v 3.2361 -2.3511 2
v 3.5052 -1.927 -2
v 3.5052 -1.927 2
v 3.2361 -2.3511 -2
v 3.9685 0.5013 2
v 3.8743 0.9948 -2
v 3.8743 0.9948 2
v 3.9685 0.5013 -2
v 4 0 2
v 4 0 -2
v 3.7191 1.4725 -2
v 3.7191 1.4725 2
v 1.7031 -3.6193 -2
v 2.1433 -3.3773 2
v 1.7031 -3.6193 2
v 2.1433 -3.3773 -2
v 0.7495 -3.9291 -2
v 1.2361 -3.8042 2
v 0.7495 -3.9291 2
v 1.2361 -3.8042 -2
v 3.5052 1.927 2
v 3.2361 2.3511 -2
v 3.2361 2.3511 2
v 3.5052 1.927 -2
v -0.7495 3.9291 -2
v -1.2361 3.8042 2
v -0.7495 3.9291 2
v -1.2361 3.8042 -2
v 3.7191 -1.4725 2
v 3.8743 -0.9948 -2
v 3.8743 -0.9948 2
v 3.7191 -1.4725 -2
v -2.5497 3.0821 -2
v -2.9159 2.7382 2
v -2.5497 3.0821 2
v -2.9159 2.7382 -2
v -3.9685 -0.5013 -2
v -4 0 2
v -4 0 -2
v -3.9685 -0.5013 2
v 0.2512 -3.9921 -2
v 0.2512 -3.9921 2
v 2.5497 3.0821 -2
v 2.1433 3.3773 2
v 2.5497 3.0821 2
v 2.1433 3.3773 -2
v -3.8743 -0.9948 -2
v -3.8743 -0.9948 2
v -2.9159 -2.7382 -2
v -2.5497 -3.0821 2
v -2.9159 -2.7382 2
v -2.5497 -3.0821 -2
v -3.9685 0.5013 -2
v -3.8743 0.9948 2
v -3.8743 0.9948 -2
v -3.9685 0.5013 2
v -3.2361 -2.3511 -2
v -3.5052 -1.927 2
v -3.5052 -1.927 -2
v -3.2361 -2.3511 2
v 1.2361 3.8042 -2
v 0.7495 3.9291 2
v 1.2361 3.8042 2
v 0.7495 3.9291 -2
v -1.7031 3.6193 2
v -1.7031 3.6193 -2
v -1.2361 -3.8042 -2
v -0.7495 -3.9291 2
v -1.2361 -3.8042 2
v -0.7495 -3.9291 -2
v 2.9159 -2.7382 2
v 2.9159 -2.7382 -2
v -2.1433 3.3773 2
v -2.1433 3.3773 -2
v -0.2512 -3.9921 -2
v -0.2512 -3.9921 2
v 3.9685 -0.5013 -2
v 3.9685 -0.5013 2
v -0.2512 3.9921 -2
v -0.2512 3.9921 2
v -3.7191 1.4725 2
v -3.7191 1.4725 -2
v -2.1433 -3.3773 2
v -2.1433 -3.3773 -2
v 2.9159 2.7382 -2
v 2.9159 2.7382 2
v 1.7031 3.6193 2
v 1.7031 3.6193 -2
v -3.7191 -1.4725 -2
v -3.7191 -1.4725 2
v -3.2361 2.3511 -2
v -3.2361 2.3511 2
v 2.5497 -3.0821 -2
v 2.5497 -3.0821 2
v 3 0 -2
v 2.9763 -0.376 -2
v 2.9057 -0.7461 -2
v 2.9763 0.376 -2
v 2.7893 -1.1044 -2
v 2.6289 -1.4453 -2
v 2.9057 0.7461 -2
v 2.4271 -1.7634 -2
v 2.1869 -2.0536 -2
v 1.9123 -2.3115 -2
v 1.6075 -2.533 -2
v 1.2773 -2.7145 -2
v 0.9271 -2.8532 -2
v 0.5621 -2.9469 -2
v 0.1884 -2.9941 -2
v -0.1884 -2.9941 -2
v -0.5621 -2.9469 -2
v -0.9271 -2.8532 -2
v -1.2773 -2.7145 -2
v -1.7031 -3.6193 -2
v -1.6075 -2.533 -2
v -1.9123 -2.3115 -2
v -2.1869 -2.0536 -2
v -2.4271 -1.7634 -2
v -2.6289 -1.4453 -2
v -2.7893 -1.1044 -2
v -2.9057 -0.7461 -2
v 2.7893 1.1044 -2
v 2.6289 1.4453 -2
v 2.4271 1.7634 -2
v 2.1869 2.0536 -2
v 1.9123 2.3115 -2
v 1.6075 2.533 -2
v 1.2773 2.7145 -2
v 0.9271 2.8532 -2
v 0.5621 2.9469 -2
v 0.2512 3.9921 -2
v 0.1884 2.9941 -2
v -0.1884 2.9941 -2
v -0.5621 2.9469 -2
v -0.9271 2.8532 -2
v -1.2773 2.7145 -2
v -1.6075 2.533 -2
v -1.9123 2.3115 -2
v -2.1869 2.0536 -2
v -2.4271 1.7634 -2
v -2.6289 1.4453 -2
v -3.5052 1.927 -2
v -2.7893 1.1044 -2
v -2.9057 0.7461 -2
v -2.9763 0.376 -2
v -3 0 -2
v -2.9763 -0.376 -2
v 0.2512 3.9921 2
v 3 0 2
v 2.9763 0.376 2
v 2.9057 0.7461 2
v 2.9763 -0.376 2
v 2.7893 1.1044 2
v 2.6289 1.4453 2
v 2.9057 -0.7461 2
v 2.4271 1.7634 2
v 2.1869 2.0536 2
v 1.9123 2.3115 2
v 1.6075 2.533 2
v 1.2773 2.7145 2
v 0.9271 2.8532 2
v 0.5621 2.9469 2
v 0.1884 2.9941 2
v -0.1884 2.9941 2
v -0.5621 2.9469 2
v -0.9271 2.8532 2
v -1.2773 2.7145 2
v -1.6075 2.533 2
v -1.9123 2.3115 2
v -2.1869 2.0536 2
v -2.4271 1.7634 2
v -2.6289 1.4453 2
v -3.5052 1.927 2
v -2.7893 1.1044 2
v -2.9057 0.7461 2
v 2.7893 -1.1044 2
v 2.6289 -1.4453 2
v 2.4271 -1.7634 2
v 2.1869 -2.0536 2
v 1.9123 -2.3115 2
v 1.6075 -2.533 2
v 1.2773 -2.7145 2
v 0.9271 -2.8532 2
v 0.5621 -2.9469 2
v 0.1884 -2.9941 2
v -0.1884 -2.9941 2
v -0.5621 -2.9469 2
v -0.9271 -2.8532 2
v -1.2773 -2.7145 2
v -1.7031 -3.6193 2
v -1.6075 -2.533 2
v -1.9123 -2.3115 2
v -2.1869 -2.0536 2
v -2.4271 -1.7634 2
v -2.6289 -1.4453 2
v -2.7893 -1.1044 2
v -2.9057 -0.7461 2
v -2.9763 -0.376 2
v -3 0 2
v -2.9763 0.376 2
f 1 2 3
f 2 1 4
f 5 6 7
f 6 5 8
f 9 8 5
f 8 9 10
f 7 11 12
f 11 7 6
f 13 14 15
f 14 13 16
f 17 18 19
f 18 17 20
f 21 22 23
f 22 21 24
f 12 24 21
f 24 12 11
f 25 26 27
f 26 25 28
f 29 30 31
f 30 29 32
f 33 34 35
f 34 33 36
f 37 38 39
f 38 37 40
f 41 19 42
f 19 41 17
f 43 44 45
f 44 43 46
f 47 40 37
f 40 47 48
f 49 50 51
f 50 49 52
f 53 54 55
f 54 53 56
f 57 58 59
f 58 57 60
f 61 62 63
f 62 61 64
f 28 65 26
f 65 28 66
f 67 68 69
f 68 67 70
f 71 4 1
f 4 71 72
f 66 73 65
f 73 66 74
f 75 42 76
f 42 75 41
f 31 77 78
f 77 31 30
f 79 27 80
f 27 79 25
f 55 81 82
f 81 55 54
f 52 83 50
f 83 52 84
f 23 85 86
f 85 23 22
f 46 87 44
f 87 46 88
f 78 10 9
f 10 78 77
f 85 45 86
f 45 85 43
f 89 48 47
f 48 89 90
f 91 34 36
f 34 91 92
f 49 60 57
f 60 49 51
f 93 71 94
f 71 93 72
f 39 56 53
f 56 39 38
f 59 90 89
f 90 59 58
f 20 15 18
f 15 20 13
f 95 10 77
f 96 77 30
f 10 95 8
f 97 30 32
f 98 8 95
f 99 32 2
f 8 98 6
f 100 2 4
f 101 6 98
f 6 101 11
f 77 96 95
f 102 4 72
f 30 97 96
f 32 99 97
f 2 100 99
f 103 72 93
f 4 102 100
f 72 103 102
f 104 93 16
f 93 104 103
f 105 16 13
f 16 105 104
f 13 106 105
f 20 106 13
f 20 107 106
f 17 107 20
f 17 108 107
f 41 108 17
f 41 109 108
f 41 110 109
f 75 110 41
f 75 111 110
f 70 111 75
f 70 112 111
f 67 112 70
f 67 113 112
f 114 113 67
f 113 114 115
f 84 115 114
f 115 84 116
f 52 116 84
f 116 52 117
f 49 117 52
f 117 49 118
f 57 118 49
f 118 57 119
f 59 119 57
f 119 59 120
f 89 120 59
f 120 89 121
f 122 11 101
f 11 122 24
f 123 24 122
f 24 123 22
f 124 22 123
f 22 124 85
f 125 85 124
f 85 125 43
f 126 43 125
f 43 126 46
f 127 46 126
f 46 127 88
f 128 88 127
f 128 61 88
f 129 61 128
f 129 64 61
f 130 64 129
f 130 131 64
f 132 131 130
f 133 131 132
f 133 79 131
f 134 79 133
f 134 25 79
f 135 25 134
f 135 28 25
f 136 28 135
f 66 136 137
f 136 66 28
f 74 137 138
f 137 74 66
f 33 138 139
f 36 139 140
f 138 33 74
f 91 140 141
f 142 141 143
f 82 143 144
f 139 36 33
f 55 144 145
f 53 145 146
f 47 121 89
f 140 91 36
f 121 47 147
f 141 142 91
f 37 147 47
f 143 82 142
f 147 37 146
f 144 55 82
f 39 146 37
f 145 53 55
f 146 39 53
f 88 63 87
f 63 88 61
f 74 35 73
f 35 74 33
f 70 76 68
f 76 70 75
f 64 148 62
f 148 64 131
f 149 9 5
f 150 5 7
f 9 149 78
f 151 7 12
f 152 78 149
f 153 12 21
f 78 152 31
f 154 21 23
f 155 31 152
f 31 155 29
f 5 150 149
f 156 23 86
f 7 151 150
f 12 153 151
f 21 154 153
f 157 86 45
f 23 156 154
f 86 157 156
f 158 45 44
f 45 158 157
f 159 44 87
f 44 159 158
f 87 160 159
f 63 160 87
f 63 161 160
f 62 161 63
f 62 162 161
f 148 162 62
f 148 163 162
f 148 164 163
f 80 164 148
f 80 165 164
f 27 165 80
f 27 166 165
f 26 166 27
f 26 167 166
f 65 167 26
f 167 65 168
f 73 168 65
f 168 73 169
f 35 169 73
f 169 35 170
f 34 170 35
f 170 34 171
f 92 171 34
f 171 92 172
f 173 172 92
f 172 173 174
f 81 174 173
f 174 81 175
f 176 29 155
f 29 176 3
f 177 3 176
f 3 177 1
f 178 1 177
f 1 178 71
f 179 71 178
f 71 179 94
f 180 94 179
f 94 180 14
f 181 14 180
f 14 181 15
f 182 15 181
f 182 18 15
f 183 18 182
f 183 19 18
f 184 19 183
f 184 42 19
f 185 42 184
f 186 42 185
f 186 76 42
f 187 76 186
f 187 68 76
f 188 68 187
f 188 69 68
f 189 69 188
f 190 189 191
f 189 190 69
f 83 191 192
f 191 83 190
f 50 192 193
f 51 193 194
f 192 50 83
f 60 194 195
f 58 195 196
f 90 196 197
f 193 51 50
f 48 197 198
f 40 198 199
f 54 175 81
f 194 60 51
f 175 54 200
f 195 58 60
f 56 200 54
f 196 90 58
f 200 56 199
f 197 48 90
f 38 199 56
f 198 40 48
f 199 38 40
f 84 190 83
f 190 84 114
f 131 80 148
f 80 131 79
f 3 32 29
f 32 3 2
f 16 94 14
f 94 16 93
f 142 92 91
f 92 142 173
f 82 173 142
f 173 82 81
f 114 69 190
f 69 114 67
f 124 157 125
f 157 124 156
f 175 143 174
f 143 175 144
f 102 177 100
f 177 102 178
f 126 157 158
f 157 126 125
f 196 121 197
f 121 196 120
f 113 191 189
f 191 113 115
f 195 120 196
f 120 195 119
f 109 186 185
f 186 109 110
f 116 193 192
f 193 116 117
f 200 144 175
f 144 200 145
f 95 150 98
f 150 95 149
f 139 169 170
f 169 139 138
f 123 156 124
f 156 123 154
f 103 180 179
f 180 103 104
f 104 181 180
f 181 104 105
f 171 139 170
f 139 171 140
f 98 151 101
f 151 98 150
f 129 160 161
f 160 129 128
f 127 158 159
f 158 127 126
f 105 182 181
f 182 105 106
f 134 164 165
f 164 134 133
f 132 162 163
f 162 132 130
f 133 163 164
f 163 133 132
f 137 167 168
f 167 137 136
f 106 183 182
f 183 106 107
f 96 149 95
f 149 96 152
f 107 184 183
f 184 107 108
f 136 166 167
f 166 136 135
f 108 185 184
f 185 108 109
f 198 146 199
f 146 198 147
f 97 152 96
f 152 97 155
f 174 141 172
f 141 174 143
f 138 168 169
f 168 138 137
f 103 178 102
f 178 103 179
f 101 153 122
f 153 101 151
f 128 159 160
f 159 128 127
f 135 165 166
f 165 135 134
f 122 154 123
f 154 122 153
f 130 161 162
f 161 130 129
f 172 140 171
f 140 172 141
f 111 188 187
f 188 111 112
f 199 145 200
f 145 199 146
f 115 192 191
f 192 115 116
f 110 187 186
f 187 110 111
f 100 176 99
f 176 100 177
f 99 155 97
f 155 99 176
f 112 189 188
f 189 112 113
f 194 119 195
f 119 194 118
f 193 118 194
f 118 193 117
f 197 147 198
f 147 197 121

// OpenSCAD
$fn = 50;


difference() {
	union() {
		translate(v = [0, 0, -2.0000000000]) {
			cylinder(h = 4, r = 4.0000000000);
		}
	}
	union() {
		translate(v = [0, 0, -100.0000000000]) {
			cylinder(h = 200, r = 3.0000000000);
		}
	}
}
